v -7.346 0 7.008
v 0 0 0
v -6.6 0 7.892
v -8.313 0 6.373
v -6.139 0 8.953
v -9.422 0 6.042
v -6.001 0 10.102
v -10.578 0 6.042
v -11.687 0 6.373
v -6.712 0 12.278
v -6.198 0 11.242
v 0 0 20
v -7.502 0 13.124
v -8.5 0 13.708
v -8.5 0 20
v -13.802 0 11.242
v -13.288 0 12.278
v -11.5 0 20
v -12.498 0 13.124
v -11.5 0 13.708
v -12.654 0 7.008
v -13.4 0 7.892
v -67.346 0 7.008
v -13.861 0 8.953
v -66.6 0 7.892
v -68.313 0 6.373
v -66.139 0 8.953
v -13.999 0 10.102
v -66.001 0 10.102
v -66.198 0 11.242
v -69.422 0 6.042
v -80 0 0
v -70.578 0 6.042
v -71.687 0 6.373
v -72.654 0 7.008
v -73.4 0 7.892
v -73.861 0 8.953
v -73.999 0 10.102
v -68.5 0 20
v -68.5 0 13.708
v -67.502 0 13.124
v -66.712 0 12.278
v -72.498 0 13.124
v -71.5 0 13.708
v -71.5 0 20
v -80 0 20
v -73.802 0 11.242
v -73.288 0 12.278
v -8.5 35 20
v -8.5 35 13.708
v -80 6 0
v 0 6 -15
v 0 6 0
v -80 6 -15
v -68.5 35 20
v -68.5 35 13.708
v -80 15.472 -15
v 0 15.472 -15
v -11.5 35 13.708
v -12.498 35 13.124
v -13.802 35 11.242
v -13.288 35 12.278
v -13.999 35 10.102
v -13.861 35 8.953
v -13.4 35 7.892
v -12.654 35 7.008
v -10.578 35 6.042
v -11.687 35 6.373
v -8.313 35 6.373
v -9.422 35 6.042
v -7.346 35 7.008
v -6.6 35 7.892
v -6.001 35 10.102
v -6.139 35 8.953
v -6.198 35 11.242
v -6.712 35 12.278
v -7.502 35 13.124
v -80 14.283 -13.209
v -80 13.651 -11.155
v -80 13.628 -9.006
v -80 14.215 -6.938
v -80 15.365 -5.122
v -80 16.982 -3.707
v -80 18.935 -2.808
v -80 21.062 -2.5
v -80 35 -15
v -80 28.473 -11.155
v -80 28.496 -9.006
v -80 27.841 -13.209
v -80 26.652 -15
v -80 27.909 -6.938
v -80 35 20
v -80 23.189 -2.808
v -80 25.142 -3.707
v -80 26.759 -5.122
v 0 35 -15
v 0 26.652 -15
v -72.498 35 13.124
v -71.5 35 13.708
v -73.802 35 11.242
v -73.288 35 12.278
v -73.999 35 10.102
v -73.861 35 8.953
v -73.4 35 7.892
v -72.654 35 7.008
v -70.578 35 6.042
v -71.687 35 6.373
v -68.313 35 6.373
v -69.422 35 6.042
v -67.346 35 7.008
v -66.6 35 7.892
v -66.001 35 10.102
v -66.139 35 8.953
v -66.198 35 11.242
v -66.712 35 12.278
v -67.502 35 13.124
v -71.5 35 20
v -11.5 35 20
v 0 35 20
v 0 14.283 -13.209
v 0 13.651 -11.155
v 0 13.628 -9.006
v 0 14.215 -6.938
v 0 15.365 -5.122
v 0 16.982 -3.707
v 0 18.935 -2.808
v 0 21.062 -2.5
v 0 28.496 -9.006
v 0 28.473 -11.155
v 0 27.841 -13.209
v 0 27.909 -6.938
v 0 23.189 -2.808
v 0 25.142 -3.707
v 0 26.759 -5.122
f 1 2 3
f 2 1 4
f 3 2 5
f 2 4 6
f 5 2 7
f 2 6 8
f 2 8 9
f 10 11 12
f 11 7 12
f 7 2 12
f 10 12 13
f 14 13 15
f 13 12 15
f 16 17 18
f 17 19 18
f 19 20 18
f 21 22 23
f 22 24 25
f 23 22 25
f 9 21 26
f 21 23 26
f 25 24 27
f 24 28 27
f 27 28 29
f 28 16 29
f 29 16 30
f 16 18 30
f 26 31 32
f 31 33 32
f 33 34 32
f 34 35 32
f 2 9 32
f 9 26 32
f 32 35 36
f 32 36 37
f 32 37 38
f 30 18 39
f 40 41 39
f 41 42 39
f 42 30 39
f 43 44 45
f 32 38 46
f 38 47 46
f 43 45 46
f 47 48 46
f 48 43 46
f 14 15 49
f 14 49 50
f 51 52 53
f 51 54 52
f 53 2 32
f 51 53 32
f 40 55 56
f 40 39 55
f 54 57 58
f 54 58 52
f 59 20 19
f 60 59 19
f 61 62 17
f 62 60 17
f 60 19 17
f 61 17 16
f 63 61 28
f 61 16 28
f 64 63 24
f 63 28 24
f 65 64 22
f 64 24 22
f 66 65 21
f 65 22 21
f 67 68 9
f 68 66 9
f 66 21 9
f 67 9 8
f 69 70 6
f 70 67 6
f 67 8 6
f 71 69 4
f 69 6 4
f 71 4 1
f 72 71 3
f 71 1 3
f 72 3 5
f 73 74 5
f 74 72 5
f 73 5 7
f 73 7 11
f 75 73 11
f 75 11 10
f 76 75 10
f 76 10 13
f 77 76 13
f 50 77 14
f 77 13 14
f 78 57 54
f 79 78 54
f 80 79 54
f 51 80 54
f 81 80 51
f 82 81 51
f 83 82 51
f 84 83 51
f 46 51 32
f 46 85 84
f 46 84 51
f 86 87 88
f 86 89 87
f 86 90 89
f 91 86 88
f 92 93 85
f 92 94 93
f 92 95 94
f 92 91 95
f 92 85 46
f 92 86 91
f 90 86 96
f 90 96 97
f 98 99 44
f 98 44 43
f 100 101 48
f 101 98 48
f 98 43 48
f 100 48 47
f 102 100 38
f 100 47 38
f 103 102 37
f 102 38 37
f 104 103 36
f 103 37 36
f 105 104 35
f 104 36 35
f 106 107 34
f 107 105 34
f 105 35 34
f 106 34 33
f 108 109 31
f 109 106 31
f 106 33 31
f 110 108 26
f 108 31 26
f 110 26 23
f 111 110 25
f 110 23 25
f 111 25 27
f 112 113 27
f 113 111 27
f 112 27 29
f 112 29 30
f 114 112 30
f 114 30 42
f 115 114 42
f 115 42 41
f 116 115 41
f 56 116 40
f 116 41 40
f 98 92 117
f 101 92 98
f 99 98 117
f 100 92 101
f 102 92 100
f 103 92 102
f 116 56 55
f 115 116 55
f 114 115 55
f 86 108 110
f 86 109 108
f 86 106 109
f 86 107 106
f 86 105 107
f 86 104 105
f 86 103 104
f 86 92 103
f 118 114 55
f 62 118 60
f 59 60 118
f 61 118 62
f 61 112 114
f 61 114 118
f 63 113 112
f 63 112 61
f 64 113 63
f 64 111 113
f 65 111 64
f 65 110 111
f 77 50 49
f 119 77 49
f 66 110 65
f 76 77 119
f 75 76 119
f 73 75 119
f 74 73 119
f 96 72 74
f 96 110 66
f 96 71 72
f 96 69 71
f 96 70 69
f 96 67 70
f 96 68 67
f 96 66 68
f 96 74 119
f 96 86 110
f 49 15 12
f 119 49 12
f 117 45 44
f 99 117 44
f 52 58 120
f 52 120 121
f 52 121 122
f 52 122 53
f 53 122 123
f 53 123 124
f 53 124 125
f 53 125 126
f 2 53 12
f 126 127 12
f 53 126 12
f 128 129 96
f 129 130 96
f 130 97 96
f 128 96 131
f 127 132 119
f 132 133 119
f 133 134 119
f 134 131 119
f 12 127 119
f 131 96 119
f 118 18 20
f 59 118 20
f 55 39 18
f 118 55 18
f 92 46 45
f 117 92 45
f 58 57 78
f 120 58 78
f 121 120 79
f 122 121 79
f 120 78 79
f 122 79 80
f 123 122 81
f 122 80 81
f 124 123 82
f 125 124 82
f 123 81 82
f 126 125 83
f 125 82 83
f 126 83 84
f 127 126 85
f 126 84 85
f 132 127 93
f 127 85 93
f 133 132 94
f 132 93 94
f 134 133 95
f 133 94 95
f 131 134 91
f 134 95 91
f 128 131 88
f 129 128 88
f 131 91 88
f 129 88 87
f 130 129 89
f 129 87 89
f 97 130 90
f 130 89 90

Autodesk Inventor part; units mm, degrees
ref_plane "YZ Plane" through (0, 0, 0) normal (1, 0, 0) x (0, 1, 0)
ref_plane "XZ Plane" through (0, 0, 0) normal (0, 1, 0) x (-1, 0, 0)
ref_plane "XY Plane" through (0, 0, 0) normal (0, 0, 1) x (1, 0, 0)
sketch "Sketch1" plane through (0, 0, 0) normal (0, 1, 0) x (-1, 0, 0)
  arc A0 (8.5, 13.7081) -> (11.5, 13.7081) centre (10, 10) ccw
  line L0 (8.5, 20) -> (8.5, 13.7081)
  line L1 (11.5, 20) -> (11.5, 13.7081)
  line L2 (10, 20) -> (10, 18.7339)
  line L3 (20, 20) -> (10, 20)
  line L4 (8.5, 20) -> (0, 20)
  line L5 (0, 20) -> (0, 0)
  line L6 (0, 0) -> (20, 0)
  line L7 (20, 0) -> (20, 20)
  arc A1 (68.5, 13.7081) -> (71.5, 13.7081) centre (70, 10) ccw
  line L8 (68.5, 20) -> (68.5, 13.7081)
  line L9 (71.5, 20) -> (71.5, 13.7081)
  line L10 (70, 20) -> (70, 18.3732)
  line L11 (80, 20) -> (70, 20)
  line L12 (68.5, 20) -> (60.9559, 20)
  line L13 (60.9559, 20) -> (60.9559, 0)
  line L14 (60.9559, 0) -> (80, 0)
  line L15 (80, 0) -> (80, 20)
  line L16 (60.9559, 0) -> (20, 0)
  line L17 (20, 0) -> (20, 20)
  line L18 (20, 20) -> (60.9559, 20)
  line L19 (60.9559, 20) -> (60.9559, 0)
  dimension "d2" = 8
  dimension "d7" = 1.5
  dimension "d8" = 1.5
  dimension "d16" = 10
  dimension "d17" = 8
  dimension "d18" = 1.5
  dimension "d19" = 1.5
  dimension "d20" = 10
  dimension "d22" = 80
  dimension "d23" = 10
  dimension "d24" = 0
  dimension "d25" = 60
  dimension "d26" = 20
  dimension "d27" = 20
  dimension "d28" = 20
  dimension "d29" = 20
  dimension "d30" = 10
  dimension "d31" = 10
  dimension "d32" = 20
extrude "Extrusion1" add sketch "Sketch1" along normal blind 36
sketch "Sketch5" plane through (-80, 0, 0) normal (-1, 0, 0) x (0, 0, 1)
  line L0 (20, 0) -> (20, 36) projected
  line L1 (20, 36) -> (-15, 36)
  line L2 (-15, 6) -> (20, 6)
  line L3 (20, 6) -> (20, 36)
  line L4 (-15, 36) -> (-15, 26.6522)
  line L5 (-15, 15.4718) -> (-15, 6)
  line L6 (0, 0) -> (0, 36) projected
  line L7 (0, 0) -> (0, 36) projected
  line L8 (0, 6) -> (0, 36)
  arc A0 (-15, 15.4718) -> (-15, 26.6522) centre (-10, 21.062) ccw
  dimension "d40" = 30
  dimension "d41" = 35
  dimension "d45" = 20
  dimension "d85" = 15
  dimension "d86" = 5
  dimension "d87" = 15
extrude "Extrusion5" add sketch "Sketch5" against normal blind 80 contours L2 L5 A0 L4 L1 L6
sketch "Sketch13" plane through (0, 36, 0) normal (0, 1, 0) x (1, 0, 0)
  line L0 (-80, -20) -> (-80, 15) projected
  line L1 (-80, -20) -> (-71.5, -20) projected
  line L2 (-71.5, -20) -> (-71.5, -13.7081) projected
  arc A0 (-68.5, -13.7081) -> (-71.5, -13.7081) centre (-70, -10) ccw projected
  line L3 (-68.5, -13.7081) -> (-68.5, -20) projected
  line L4 (-68.5, -20) -> (-11.5, -20) projected
  line L5 (-11.5, -20) -> (-11.5, -13.7081) projected
  arc A1 (-8.5, -13.7081) -> (-11.5, -13.7081) centre (-10, -10) ccw projected
  line L6 (-8.5, -13.7081) -> (-8.5, -20) projected
  line L7 (-8.5, -20) -> (0, -20) projected
  line L8 (0, -20) -> (0, 15) projected
  line L9 (-80, 15) -> (0, 15) projected
  point P0 (0, 0)
extrude "Extrusion11" cut sketch "Sketch13" against normal blind 1
equation "\"d2\" = RodDiameter"
equation "\"d17\" = d2"
equation "\"RodDiameter\" = 8"
equation "\"VerticalBearingOD\" = 16"
equation "\"PrintingClearance\" = 0.2"
equation "\"d21\" = 8"
properties part number "GantryHolder"
